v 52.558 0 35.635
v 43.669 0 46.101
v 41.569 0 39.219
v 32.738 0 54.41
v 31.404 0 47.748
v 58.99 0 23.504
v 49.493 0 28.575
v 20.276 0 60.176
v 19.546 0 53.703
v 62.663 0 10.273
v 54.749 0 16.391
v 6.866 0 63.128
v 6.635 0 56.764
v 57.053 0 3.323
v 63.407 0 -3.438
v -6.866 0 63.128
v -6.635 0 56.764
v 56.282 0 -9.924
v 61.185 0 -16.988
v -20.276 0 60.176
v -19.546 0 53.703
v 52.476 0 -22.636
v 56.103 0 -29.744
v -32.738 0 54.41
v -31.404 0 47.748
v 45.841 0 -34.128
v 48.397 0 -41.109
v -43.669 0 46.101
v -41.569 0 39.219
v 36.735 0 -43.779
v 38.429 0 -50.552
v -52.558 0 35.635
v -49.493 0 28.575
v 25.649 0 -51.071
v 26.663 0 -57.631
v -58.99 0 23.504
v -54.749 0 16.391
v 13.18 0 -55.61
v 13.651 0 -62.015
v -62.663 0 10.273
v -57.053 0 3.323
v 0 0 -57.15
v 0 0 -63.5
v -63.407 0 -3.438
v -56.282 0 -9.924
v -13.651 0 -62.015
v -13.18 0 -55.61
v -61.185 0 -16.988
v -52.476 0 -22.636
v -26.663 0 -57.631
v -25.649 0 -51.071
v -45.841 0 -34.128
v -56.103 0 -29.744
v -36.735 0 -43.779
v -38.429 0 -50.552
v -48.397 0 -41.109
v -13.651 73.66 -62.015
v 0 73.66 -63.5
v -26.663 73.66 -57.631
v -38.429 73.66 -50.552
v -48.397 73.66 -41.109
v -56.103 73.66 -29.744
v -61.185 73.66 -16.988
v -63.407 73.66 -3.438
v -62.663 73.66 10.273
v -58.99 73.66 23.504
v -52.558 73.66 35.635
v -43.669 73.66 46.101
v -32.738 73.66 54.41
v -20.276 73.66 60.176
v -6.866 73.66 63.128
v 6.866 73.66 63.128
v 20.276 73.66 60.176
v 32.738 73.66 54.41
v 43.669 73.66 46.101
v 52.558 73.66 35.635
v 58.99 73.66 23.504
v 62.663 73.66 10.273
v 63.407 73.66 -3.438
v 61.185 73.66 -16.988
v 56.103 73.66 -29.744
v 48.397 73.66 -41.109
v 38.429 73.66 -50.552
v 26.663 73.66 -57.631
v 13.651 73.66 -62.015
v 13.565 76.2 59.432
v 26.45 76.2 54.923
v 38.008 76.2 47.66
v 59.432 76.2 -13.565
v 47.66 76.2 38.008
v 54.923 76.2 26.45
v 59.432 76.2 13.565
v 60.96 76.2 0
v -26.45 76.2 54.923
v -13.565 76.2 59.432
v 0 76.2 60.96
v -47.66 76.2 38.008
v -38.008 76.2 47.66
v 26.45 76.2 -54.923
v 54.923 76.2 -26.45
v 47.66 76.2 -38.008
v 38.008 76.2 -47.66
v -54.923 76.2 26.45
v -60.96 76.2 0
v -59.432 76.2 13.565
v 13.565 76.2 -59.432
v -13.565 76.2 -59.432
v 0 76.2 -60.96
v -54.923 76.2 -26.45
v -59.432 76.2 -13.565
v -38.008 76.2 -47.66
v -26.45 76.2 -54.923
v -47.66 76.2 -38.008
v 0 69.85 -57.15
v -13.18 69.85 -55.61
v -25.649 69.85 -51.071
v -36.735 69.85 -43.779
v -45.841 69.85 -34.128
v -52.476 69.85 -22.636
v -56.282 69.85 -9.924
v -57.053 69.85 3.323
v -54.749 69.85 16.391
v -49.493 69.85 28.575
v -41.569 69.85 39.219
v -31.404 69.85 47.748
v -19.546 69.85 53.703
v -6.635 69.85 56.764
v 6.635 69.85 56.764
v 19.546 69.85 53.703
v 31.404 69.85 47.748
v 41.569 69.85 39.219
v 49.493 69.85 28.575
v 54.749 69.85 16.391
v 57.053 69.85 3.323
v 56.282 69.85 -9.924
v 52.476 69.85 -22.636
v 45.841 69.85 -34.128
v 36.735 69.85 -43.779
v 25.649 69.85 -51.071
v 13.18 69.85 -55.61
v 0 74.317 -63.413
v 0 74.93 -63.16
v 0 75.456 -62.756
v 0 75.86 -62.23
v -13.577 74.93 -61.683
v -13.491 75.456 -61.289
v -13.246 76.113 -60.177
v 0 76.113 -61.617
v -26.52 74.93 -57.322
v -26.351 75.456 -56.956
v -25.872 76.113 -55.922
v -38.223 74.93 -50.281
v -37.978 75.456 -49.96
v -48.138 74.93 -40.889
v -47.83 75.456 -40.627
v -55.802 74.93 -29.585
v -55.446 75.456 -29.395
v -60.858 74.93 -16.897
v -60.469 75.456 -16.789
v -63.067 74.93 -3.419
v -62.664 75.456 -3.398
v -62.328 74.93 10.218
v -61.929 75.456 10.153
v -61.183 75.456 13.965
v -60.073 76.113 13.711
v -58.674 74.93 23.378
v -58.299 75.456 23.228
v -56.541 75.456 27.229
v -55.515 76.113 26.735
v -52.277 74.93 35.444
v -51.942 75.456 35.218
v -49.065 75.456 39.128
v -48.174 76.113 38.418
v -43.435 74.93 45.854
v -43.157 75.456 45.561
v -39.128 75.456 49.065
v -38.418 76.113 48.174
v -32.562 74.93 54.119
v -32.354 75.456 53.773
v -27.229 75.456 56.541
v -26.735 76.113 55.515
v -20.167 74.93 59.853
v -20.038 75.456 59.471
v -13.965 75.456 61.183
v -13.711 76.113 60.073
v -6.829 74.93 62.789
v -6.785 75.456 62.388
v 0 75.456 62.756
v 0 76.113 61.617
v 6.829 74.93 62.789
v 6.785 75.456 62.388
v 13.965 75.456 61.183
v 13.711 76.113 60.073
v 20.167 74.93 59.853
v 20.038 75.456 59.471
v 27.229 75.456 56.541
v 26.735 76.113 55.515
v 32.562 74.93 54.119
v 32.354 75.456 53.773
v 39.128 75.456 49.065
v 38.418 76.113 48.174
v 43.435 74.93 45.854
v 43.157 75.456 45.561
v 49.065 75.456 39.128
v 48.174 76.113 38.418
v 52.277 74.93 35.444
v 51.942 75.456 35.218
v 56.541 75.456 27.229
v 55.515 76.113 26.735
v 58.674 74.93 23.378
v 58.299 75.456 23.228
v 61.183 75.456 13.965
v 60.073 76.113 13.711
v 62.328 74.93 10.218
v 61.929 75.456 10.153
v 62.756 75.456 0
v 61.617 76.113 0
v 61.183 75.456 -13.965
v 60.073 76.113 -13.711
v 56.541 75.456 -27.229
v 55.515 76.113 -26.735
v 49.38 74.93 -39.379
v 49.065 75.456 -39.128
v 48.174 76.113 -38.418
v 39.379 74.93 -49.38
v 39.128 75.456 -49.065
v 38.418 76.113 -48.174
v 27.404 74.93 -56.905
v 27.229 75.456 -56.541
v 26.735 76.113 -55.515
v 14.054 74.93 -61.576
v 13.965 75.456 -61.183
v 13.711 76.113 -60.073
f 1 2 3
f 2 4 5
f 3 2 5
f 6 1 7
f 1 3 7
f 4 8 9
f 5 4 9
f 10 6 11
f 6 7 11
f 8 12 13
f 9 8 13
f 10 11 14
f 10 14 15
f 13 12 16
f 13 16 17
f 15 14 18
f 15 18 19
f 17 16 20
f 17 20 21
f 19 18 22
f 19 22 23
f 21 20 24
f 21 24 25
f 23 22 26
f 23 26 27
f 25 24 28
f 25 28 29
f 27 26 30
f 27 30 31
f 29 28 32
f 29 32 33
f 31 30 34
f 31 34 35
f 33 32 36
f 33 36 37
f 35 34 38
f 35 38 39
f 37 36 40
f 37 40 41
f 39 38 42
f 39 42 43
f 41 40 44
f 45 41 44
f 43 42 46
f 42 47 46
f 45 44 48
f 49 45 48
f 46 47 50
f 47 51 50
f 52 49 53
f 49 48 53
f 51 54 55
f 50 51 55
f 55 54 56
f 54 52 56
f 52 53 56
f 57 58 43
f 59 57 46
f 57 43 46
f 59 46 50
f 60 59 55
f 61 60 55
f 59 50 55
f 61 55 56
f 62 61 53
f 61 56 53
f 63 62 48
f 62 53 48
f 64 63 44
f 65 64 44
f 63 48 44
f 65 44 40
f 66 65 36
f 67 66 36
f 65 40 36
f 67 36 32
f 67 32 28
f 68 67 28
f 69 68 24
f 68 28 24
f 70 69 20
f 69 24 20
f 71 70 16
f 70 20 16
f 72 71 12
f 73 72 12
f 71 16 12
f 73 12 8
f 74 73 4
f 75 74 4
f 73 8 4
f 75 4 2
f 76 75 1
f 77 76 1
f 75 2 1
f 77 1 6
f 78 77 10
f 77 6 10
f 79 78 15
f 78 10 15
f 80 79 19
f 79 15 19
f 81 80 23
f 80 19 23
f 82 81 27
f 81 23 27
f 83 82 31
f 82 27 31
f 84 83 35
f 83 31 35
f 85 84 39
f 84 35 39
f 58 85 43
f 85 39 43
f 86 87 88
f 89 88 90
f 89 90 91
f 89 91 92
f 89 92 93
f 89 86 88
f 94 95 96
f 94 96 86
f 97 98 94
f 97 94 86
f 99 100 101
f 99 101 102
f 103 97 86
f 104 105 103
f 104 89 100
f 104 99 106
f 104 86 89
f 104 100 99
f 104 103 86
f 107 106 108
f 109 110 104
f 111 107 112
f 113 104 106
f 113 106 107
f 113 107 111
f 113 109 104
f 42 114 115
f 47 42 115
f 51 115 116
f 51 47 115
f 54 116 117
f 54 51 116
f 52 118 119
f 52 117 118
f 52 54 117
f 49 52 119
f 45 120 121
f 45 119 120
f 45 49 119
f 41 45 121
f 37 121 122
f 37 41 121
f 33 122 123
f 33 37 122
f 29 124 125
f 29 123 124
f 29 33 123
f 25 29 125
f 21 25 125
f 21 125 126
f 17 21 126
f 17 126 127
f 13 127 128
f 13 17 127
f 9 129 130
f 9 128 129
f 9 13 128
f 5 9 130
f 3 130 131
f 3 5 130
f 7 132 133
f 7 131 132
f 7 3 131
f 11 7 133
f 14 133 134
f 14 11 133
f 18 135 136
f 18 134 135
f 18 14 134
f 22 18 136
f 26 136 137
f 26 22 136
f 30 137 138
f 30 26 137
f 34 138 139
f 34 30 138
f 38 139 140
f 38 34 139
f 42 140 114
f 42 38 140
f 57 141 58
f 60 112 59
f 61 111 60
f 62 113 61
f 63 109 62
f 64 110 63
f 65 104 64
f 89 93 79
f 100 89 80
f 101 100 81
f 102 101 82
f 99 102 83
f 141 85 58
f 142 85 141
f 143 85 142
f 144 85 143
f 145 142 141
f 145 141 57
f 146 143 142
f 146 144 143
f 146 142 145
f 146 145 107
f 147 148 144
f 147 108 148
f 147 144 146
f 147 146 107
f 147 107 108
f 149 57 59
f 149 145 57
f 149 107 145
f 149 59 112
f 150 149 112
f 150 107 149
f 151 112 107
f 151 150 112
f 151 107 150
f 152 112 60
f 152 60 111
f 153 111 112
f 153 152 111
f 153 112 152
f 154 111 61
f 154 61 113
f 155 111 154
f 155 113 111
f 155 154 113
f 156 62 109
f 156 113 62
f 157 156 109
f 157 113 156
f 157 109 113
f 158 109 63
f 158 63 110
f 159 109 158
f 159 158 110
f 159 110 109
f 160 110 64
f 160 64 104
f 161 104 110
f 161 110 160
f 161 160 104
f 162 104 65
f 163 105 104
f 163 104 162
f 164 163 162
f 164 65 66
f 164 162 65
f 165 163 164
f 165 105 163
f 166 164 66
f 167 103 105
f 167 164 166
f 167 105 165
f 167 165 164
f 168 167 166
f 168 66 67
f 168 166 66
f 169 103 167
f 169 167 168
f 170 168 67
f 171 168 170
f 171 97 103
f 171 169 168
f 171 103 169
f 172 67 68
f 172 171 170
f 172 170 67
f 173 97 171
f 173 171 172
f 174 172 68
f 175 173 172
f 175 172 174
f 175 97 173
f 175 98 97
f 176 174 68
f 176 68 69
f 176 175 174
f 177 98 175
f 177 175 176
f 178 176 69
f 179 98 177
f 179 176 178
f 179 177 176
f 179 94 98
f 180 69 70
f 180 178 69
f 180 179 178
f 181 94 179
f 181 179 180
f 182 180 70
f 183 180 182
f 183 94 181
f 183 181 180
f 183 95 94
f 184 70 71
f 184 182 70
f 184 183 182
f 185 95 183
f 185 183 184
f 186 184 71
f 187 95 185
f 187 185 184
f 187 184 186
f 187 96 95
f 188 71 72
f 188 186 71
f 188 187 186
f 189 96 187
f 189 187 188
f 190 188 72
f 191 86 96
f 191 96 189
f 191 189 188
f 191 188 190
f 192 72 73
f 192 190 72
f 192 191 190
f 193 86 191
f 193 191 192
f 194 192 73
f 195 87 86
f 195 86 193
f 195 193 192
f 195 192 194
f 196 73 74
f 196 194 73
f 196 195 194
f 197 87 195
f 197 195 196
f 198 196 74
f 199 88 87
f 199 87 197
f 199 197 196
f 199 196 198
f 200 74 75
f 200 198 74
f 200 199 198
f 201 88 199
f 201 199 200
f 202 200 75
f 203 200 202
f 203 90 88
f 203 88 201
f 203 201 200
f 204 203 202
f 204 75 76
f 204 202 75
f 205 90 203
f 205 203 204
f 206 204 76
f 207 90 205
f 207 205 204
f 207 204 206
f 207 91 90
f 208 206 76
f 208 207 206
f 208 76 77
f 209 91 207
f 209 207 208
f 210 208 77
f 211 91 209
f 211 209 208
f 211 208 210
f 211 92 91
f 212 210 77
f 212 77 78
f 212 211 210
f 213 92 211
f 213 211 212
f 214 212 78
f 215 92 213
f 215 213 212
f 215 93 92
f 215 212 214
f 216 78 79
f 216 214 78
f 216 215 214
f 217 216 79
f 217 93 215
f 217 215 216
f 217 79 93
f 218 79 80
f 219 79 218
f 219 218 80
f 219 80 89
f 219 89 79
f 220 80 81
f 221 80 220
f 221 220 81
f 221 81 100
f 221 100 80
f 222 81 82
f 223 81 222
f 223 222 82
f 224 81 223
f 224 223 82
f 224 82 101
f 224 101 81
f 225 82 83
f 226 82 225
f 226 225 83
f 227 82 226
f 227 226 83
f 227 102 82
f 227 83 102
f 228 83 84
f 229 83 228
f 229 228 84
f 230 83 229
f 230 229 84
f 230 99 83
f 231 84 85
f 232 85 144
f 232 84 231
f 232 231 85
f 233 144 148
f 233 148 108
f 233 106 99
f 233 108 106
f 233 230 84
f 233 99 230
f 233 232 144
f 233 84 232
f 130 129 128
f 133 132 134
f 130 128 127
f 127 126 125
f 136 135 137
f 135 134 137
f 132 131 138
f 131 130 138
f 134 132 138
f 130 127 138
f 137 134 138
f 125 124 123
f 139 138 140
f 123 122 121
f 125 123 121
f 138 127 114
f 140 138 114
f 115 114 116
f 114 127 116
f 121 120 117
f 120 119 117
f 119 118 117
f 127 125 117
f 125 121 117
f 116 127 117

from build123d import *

# Parameters (mm, degrees)
SKETCH1_R           = 63.5
BOSS_EXTRUDE1_DEPTH = 76.2
SHELL1_T            = -6.35
FILLET1_R           = 2.54


with BuildPart() as part:
    # Sketch1 → Boss-Extrude1 (new body)
    with BuildSketch(Plane(origin=(0, 0, 0), x_dir=(1, 0, 0), z_dir=(0, 1, 0))):
        with Locations(Location((0, 0, 0), (0, 0, 90))):
            Circle(SKETCH1_R)
    extrude(amount=BOSS_EXTRUDE1_DEPTH)

    # Shell1
    shell1_openings = [part.faces().sort_by_distance(p)[0] for p in [
        (0, 0, 0),
    ]]
    offset(amount=SHELL1_T, openings=shell1_openings, kind=Kind.INTERSECTION)

    # Fillet1
    fillet1_edges = [part.edges().sort_by_distance(p)[0] for p in [
        (0, 76.2, 63.5),
    ]]
    fillet(fillet1_edges, radius=FILLET1_R)


solid = part.part
